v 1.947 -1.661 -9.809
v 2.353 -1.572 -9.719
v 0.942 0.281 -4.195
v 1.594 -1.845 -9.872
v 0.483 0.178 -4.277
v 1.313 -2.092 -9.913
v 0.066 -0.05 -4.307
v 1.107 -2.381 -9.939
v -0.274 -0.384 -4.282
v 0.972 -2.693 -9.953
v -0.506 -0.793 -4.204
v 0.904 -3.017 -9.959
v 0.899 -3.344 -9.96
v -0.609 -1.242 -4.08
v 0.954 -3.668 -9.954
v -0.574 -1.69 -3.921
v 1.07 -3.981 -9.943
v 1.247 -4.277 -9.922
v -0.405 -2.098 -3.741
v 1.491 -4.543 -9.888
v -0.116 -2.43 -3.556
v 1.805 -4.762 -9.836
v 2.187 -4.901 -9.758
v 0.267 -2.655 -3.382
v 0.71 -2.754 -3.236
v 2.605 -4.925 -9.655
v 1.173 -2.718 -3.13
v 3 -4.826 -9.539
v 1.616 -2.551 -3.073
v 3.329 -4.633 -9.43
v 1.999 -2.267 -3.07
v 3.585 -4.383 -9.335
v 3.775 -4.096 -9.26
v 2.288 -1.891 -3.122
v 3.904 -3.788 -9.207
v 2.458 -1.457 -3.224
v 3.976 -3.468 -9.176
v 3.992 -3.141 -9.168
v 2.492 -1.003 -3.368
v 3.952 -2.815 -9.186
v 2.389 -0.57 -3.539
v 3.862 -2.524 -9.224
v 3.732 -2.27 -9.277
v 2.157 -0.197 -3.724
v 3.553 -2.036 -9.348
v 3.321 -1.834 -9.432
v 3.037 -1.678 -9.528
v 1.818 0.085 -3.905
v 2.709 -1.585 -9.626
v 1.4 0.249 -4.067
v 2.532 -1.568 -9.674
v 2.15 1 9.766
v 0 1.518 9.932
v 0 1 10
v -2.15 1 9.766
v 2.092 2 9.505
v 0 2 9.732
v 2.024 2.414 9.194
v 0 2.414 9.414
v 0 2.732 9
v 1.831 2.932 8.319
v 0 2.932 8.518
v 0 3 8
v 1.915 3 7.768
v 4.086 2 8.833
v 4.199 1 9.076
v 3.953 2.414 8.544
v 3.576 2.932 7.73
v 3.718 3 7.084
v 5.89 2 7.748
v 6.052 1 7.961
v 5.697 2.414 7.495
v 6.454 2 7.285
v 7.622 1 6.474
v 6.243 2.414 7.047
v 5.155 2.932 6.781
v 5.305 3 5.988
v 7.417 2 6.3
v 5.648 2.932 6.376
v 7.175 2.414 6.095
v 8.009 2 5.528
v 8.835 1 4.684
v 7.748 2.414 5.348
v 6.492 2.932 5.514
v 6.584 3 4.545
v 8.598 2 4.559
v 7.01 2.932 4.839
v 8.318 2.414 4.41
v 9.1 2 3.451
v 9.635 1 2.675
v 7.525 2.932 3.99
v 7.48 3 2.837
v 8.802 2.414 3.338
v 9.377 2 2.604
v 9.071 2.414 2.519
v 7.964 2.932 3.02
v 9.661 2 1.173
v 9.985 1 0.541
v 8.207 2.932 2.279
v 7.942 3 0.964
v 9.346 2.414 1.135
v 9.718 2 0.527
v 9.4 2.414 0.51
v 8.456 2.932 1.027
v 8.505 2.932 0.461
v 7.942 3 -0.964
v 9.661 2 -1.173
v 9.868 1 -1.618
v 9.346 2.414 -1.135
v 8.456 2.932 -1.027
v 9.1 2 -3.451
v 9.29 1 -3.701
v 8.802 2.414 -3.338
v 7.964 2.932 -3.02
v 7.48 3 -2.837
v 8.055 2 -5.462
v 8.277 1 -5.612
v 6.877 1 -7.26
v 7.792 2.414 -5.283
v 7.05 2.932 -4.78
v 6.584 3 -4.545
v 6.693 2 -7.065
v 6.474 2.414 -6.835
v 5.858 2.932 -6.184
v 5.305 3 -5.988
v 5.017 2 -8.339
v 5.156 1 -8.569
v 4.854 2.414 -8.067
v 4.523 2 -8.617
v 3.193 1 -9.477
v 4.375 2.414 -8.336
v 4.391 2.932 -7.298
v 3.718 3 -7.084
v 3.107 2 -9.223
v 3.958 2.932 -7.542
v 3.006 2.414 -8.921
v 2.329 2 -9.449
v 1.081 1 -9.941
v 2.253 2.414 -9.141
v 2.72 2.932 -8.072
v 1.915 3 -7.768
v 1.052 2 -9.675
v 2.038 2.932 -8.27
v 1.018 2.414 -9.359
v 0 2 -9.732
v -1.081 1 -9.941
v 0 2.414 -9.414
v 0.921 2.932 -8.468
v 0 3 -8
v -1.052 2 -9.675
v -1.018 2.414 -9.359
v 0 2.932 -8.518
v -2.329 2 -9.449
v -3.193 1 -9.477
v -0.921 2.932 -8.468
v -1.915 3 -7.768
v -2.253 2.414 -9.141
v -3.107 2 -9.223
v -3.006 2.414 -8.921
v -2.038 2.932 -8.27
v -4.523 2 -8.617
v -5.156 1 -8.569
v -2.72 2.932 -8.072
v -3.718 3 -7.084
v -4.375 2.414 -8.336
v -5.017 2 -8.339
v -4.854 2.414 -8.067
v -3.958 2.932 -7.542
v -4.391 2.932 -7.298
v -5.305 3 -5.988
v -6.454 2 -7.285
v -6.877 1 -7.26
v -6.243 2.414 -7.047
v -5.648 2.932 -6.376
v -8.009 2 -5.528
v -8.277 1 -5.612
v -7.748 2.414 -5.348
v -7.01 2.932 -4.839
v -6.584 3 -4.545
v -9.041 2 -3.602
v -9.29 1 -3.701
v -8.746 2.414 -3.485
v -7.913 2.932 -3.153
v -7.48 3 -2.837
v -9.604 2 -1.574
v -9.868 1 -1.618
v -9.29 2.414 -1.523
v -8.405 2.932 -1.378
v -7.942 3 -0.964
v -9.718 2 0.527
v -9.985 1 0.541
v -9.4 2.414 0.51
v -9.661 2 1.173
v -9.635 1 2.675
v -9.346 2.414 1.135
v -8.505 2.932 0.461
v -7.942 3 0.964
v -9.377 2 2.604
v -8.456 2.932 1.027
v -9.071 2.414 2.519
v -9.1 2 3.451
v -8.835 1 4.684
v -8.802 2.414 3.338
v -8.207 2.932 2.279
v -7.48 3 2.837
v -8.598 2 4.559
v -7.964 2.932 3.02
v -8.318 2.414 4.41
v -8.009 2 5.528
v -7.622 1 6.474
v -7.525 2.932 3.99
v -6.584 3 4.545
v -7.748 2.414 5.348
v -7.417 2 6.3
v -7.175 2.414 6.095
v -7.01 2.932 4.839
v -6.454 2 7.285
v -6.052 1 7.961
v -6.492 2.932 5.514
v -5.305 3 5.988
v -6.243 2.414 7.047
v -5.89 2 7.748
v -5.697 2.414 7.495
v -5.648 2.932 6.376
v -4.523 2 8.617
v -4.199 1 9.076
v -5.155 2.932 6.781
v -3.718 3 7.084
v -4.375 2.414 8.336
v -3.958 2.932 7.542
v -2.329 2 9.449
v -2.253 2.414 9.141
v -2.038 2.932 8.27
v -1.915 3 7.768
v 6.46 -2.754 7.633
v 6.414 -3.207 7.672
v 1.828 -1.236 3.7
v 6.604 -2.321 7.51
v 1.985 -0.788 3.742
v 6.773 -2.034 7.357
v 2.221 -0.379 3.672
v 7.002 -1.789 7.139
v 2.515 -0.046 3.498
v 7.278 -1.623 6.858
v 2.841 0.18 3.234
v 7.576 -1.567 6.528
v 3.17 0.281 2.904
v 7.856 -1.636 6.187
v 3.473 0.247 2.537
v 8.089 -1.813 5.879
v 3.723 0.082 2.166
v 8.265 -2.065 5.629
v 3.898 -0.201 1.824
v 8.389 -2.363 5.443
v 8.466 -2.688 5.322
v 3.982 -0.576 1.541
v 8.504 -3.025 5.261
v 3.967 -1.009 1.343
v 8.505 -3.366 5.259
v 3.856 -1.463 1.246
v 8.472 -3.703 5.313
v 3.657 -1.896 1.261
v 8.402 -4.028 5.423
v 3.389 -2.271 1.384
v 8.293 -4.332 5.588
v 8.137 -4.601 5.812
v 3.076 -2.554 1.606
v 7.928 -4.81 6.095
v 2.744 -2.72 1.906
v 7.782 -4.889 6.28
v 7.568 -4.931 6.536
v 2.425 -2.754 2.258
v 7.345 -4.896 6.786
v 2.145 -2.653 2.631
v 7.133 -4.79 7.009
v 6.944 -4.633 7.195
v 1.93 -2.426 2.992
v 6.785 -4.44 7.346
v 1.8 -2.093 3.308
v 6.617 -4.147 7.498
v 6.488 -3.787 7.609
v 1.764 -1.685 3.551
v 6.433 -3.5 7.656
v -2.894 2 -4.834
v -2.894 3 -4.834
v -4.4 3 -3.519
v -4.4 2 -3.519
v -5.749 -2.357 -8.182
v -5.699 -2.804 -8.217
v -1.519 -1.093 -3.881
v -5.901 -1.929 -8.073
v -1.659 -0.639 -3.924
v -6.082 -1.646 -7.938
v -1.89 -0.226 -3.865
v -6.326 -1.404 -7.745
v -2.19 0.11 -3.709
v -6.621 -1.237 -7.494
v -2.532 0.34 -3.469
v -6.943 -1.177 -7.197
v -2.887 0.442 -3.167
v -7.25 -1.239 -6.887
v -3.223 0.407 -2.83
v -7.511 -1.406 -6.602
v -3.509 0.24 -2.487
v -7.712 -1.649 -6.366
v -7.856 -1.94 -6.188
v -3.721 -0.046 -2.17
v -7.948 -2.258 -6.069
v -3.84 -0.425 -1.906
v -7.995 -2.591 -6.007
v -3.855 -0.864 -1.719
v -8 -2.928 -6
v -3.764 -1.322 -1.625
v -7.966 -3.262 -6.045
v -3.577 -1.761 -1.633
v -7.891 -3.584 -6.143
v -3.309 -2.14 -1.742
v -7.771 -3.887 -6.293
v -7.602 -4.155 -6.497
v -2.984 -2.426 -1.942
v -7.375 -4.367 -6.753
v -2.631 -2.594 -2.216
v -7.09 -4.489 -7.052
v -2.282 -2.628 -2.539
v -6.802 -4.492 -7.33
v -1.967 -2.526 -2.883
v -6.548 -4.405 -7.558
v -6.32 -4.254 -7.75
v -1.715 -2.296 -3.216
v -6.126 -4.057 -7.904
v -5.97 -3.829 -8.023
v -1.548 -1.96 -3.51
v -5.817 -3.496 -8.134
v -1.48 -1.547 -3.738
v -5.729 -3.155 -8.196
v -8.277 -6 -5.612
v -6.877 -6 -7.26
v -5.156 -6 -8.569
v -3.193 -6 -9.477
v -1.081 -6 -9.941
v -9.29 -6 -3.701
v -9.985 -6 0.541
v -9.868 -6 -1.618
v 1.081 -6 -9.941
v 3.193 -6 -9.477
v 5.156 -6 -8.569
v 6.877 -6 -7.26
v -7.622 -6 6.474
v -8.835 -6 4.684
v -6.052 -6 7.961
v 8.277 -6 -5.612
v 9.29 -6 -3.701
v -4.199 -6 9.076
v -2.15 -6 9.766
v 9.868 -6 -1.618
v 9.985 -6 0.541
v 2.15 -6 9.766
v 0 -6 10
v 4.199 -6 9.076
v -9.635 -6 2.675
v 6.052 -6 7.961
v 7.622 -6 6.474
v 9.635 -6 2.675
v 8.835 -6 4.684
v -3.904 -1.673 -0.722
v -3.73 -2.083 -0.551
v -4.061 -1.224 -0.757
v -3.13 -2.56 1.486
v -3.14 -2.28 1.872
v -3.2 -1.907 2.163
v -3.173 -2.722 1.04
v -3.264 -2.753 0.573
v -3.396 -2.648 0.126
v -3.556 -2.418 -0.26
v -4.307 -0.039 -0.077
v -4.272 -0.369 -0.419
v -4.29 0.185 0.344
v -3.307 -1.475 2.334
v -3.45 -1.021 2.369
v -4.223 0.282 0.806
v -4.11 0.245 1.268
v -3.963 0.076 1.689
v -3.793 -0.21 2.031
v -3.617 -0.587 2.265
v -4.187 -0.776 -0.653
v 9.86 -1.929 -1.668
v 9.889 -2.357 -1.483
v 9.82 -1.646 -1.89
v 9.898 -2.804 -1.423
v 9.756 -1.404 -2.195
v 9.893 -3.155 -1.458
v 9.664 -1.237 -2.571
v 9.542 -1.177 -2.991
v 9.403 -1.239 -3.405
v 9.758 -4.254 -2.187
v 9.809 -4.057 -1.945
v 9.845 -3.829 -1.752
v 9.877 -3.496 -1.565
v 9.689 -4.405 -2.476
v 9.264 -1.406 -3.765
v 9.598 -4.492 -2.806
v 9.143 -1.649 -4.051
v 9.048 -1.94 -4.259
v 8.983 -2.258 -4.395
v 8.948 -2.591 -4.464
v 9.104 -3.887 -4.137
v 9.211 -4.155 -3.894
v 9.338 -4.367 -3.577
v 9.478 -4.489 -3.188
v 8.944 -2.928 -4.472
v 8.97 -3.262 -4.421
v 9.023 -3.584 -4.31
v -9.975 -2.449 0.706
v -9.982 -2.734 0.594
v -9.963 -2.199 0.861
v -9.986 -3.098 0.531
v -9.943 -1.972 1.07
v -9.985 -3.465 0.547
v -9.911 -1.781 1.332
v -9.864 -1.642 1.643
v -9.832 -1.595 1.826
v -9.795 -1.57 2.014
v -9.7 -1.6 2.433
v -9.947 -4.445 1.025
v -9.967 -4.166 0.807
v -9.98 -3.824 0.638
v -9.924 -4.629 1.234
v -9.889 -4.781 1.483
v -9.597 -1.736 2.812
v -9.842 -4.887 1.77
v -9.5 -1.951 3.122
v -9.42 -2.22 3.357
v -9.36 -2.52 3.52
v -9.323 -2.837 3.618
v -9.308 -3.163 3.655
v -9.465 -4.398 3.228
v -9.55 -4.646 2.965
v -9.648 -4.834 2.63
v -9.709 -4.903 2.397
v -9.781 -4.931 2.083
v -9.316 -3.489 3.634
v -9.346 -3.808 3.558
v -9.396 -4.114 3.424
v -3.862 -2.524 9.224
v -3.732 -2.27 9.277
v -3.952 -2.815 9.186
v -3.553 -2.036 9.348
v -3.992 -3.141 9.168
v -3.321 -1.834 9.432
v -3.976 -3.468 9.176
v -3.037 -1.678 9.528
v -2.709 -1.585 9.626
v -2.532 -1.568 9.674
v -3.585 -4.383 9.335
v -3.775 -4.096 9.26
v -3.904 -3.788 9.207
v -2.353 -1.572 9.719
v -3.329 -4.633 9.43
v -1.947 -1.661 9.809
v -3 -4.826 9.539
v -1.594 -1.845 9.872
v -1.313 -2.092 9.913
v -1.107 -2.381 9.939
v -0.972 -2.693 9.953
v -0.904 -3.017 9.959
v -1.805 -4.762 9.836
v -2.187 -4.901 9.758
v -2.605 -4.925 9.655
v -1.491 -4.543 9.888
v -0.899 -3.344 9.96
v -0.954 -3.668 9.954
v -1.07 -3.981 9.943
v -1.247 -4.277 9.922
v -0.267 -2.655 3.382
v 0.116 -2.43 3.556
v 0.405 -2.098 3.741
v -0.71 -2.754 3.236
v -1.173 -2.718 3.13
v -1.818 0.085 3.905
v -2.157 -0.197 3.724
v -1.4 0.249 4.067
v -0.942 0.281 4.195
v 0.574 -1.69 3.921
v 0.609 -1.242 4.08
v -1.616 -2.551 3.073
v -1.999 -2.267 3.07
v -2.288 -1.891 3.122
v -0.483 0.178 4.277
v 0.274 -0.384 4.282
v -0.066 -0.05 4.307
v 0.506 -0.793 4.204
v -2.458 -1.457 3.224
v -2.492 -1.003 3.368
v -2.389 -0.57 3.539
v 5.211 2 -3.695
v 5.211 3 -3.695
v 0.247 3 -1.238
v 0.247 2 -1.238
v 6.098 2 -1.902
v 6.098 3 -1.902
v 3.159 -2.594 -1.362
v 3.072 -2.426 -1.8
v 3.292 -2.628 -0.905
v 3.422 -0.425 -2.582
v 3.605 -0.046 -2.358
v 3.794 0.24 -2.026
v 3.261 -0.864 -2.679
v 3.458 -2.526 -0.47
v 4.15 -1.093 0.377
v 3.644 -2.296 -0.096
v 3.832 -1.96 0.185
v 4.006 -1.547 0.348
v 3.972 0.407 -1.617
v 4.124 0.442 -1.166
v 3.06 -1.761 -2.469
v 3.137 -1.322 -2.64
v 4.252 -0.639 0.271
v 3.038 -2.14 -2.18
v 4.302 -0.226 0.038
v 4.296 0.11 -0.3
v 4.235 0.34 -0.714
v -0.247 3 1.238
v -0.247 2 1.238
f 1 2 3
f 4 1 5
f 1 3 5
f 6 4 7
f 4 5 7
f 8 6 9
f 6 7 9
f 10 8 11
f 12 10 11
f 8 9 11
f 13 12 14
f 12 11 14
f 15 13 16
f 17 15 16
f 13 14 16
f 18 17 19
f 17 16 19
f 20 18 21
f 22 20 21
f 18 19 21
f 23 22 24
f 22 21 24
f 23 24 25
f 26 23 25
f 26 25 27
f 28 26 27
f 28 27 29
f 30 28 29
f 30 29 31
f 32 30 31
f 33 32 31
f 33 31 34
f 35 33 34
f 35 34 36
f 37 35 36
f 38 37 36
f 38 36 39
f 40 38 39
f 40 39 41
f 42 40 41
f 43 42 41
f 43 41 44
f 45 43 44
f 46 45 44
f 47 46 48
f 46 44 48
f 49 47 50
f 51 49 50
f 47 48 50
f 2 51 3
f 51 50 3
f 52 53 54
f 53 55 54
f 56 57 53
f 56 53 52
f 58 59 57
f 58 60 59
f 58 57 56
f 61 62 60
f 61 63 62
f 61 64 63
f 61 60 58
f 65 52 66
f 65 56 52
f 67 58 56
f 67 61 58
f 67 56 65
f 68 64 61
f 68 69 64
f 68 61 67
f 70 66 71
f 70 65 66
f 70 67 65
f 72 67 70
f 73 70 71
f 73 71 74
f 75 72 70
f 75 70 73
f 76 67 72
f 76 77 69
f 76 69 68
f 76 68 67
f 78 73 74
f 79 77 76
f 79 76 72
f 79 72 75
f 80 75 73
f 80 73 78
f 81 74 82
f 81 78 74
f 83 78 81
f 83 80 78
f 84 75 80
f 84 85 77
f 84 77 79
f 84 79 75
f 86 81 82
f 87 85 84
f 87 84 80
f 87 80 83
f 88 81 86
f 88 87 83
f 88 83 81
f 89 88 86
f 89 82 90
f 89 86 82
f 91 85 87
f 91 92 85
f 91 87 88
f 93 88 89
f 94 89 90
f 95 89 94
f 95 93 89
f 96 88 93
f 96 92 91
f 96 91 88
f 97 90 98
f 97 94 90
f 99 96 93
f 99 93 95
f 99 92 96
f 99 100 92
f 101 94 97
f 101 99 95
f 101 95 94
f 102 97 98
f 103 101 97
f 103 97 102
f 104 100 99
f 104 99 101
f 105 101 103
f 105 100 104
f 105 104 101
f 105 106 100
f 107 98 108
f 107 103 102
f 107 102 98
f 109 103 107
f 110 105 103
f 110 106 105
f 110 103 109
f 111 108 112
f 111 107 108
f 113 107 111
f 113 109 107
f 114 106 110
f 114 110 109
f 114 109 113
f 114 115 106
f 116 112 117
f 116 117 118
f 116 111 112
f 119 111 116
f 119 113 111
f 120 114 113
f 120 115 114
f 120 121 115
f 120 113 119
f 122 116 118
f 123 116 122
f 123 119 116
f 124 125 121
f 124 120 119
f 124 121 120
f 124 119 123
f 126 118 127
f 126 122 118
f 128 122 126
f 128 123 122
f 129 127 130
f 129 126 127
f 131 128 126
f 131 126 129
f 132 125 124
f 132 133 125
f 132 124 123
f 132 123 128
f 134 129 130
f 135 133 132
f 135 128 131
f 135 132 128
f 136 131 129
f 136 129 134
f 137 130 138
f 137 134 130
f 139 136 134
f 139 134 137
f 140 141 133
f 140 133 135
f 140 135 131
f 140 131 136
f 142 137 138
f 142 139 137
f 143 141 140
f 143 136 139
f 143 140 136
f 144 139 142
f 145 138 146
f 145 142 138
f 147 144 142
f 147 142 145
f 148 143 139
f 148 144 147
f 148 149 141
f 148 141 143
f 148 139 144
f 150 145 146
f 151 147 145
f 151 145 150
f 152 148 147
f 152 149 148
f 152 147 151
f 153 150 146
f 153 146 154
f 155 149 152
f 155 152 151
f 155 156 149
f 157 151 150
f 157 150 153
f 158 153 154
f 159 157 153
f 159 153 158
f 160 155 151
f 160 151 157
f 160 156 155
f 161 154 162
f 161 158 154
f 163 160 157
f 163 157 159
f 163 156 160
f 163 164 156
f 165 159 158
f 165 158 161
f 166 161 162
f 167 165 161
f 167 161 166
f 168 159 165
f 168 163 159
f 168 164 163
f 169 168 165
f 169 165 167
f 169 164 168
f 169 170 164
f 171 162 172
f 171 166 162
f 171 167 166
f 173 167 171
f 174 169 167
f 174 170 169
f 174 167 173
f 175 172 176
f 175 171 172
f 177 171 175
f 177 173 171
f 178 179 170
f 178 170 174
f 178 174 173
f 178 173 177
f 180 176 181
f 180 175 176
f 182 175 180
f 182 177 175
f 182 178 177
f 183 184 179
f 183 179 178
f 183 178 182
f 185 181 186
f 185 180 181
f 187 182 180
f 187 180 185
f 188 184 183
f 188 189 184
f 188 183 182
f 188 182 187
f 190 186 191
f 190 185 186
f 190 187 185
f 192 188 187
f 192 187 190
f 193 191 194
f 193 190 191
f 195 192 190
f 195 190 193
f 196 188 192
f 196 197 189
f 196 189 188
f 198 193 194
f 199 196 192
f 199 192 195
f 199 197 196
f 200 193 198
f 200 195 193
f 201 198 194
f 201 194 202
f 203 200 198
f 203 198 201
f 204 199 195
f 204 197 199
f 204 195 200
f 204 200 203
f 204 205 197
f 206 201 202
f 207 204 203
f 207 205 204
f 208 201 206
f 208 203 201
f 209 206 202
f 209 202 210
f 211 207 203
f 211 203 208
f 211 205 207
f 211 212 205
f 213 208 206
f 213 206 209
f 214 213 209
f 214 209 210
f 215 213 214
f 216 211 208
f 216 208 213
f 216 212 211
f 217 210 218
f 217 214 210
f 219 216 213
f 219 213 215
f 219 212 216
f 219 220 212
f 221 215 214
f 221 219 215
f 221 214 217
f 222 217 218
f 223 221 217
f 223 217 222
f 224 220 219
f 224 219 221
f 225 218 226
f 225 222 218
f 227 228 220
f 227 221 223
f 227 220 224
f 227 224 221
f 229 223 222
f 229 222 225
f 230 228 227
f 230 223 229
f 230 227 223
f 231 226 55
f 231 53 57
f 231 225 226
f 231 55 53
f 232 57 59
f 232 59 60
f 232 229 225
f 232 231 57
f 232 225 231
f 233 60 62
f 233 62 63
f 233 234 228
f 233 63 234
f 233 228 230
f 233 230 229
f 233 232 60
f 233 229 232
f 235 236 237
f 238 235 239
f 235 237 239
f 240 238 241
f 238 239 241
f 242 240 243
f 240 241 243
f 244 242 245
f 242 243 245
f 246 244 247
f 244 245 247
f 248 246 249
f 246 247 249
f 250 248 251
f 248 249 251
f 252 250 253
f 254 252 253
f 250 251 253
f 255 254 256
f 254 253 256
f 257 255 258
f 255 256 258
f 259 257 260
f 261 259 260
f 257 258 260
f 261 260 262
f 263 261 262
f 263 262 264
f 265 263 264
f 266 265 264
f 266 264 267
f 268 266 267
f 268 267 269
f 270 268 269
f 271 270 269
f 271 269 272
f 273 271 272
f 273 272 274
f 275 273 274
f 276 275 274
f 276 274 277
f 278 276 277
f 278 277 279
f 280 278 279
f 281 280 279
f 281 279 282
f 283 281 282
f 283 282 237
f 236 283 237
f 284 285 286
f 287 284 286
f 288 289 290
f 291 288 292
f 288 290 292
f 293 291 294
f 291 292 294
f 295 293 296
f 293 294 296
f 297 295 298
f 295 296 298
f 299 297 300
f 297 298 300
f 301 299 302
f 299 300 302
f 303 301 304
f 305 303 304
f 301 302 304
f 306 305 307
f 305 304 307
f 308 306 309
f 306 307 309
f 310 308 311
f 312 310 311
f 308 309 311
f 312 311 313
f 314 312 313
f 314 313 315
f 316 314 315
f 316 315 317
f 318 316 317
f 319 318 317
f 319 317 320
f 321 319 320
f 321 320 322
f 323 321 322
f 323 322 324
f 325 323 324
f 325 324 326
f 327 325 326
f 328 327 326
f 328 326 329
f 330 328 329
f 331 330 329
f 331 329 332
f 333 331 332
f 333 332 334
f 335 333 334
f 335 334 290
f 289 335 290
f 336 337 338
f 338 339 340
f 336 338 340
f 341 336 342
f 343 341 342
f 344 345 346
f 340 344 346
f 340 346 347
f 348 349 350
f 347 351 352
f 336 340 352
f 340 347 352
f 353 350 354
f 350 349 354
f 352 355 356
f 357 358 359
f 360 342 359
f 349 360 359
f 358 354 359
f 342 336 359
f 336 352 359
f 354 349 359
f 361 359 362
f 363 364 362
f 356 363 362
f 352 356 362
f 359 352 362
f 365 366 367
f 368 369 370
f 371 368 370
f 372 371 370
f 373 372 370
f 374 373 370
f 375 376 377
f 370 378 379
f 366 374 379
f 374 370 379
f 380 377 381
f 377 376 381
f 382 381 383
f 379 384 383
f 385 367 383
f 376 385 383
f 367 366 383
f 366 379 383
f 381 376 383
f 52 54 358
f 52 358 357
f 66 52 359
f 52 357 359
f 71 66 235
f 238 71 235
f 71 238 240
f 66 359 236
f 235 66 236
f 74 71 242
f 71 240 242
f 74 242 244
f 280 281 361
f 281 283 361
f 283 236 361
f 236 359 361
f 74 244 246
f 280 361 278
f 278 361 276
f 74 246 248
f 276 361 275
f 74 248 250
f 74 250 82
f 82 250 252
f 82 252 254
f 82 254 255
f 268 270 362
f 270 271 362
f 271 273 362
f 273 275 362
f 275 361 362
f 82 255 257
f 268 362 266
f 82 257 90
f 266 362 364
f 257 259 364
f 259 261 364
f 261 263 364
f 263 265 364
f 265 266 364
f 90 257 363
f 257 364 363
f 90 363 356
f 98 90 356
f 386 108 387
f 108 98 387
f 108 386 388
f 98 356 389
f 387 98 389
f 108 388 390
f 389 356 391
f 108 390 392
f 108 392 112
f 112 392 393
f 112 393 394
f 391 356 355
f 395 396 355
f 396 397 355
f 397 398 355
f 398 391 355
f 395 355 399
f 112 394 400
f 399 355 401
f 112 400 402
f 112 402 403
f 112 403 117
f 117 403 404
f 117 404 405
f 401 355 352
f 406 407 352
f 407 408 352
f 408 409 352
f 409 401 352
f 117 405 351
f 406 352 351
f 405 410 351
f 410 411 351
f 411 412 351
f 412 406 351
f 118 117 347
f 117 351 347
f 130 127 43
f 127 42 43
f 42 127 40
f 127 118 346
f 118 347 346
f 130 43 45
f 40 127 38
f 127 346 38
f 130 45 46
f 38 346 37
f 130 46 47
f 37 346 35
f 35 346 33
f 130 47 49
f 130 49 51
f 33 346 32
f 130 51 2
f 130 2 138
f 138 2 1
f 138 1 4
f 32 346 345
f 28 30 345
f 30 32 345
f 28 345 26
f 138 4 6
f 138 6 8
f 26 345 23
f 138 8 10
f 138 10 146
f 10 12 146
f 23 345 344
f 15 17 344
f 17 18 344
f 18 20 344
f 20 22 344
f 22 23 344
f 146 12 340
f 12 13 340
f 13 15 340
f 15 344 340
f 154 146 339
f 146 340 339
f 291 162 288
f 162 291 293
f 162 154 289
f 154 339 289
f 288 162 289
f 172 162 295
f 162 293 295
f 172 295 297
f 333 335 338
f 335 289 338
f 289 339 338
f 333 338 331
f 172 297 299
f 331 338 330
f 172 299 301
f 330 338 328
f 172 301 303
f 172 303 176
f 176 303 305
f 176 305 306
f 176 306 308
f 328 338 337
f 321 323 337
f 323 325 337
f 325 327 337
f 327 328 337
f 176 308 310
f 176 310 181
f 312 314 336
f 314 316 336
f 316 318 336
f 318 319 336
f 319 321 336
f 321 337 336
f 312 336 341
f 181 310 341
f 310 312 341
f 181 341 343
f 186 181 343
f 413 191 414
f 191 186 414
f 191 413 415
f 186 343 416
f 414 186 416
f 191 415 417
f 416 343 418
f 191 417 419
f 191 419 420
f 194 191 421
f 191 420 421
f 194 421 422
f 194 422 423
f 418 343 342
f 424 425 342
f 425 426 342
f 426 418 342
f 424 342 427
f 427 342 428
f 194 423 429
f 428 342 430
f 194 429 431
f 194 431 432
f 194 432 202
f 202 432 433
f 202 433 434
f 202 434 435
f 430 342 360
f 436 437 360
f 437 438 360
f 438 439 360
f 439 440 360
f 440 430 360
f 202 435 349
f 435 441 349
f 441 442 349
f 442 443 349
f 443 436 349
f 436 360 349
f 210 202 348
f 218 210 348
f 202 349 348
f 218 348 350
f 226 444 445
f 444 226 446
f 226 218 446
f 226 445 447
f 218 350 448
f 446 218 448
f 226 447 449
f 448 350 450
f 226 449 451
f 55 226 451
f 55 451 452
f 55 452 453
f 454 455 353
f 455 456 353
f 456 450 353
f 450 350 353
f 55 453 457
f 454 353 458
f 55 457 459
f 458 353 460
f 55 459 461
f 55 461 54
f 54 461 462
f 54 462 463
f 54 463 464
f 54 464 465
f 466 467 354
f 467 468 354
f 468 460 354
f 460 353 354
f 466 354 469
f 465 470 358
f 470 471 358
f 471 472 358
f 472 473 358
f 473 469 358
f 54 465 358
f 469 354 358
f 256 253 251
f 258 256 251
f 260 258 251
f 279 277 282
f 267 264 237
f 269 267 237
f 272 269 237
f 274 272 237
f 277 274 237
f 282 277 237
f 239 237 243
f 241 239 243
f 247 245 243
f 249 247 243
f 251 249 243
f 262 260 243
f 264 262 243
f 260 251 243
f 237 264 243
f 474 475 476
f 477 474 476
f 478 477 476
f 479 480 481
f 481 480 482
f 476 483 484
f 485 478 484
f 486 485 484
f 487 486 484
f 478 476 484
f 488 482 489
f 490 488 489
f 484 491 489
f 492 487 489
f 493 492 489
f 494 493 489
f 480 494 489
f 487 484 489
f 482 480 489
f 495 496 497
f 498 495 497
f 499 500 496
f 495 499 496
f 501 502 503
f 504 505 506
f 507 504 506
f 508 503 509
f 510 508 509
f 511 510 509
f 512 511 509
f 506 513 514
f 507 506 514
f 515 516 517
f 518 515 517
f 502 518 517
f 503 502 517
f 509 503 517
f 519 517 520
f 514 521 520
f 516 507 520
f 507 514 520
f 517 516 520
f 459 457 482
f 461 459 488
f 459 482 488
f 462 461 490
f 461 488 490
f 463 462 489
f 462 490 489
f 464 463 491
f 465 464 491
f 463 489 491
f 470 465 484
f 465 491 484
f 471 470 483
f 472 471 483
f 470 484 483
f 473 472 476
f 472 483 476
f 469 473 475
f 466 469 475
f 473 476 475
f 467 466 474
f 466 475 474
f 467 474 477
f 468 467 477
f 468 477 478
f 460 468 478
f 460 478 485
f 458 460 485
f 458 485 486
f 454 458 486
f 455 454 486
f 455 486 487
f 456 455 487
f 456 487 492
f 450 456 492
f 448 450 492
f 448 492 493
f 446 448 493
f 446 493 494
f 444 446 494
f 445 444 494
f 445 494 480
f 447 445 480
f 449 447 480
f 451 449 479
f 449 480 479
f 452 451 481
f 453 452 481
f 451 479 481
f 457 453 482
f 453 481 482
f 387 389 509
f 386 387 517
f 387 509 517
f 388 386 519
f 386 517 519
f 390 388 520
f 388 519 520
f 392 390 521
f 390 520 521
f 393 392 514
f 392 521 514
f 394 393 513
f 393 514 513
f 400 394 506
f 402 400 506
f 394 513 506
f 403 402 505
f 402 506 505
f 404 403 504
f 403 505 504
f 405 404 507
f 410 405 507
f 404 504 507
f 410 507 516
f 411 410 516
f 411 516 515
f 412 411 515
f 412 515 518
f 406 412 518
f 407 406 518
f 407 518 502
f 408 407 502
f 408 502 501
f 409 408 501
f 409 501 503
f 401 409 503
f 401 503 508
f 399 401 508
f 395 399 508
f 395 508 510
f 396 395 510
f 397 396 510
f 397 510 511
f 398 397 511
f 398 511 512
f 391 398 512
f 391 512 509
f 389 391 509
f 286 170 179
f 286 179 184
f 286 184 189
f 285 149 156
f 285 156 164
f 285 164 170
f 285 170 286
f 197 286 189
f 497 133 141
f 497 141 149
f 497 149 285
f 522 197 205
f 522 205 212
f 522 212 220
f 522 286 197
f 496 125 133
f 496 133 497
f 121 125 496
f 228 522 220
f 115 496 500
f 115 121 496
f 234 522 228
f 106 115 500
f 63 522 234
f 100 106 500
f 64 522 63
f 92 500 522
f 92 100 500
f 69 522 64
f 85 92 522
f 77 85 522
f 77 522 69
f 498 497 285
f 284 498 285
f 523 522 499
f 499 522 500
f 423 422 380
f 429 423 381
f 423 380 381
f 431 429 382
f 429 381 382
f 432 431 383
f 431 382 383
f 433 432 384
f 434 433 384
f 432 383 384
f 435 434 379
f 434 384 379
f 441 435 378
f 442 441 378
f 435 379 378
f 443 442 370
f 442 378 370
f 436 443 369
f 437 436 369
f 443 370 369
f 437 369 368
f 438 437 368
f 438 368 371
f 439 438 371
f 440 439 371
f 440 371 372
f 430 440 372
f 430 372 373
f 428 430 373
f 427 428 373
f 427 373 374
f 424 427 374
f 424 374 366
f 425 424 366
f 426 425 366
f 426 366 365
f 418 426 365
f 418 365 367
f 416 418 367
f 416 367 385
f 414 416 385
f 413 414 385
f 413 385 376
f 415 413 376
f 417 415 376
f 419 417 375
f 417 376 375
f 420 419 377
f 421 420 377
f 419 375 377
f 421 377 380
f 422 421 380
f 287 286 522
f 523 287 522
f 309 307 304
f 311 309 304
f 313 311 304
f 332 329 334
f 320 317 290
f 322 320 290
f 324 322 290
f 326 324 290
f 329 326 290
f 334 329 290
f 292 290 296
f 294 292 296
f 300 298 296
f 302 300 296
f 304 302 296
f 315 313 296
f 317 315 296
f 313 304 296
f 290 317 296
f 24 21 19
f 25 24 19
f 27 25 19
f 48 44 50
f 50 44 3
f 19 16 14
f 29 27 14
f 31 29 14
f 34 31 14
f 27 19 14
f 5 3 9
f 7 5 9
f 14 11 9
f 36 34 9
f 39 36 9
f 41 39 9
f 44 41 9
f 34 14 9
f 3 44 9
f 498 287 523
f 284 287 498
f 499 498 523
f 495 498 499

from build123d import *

# Parameters (mm, degrees)
BASE_DEPTH              = 3
BASE_DEPTH_BACK         = 6
SKETCH1_R               = 10
SKETCH3_R               = 1.6
HOLE2_DEPTH             = 19.1581212
HOLE2MIRROR_COUNT       = 2
SKETCH4_R               = 1.6
HOLE3_DEPTH             = 19.100993715
SKETCH5_R               = 1.6
CUT_EXTRUDE1_DEPTH      = 19.311666101
SKETCH6_R               = 1.6
CUT_EXTRUDE2_DEPTH      = 19.560472272
SKETCH7_R               = 1.6
CUT_EXTRUDE3_DEPTH      = 19.646604846
FILLET1_R               = 2
CUT_EXTRUDE_THIN1_DEPTH = 1


with BuildPart() as part:
    # Sketch1 → base (new, two sides: drawn at the far end of the back side and taken through both)
    with BuildSketch(Plane(origin=(0, 0, 0), x_dir=(1, 0, 0), z_dir=(0, 1, 0)).offset(-BASE_DEPTH_BACK)):
        Circle(SKETCH1_R)
    extrude(amount=BASE_DEPTH + BASE_DEPTH_BACK)

    # Sketch3 → hole2 (cut, through all)
    with BuildSketch(Plane(origin=(-0.941672921, -1.236067977, 3.685836142), x_dir=(-0.9718935871364875, 0.07382318789513377, -0.22354639834264944), z_dir=(0.23541823021467095, 0.3090169943749464, -0.921459035481267))):
        Circle(SKETCH3_R)
    hole2 = extrude(amount=-HOLE2_DEPTH, mode=Mode.SUBTRACT)

    # hole2mirror: hole2 ×2 about axis
    hole2mirror_axis = Axis((0, 5.5, 0), (0, -1, 0))
    for i in range(1, HOLE2MIRROR_COUNT):
        add(hole2.rotate(hole2mirror_axis, i * 360 / HOLE2MIRROR_COUNT), mode=Mode.SUBTRACT)

    # Sketch4 → hole3 (cut, through all)
    with BuildSketch(Plane(origin=(-3.717841, -1.236067977, 0.806098168), x_dir=(-0.19123247894507908, -0.06357892752956036, -0.979483465389136), z_dir=(0.9294602499075393, 0.30901699437494623, -0.20152454200243008))):
        Circle(SKETCH4_R)
    extrude(amount=-HOLE3_DEPTH, mode=Mode.SUBTRACT)

    # Sketch5 → Cut-Extrude1 (cut, through all)
    with BuildSketch(Plane(origin=(3.671965021, -1.093066116, -1.149730122), x_dir=(0.2754858058396647, -0.08200628219437099, 0.9578008876909271), z_dir=(-0.9179912552075574, 0.27326652891267317, 0.2874325304110031))):
        Circle(SKETCH5_R)
    extrude(amount=-CUT_EXTRUDE1_DEPTH, mode=Mode.SUBTRACT)

    # Sketch6 → Cut-Extrude2 (cut, through all)
    with BuildSketch(Plane(origin=(2.875583134, -1.236067977, 2.490613899), x_dir=(-0.5720437997755544, 0.24589274231852376, 0.782497699941298), z_dir=(-0.7188957835464718, 0.30901699437494723, -0.6226534747245682))):
        Circle(SKETCH6_R)
    extrude(amount=-CUT_EXTRUDE2_DEPTH, mode=Mode.SUBTRACT)

    # Sketch7 → Cut-Extrude3 (cut, through all)
    with BuildSketch(Plane(origin=(-2.670502563, -1.093066116, -2.770130417), x_dir=(0.7444971483747472, -0.2450509606833859, -0.6210265877802813), z_dir=(0.6676256406564008, 0.2732665289126714, 0.6925326043690294))):
        Circle(SKETCH7_R)
    extrude(amount=-CUT_EXTRUDE3_DEPTH, mode=Mode.SUBTRACT)

    # Fillet1
    fillet1_edges = [part.edges().sort_by_distance(p)[0] for p in [
        (-10, 3, 0),
    ]]
    fillet(fillet1_edges, radius=FILLET1_R)

    # Sketch9 → Cut-Extrude-Thin1 (cut)
    with BuildSketch(Plane(origin=(0, 3, 0), x_dir=(1, 0, 0), z_dir=(0, 1, 0))):
        Polygon((-4.40005736, 3.518760981), (-0.246688962, -1.237871846), (6.097894842, 1.902273668), (5.210740629, 3.694746095), (0.246688962, 1.237871846), (-2.893541545, 4.834211512), align=None)
    extrude(amount=-CUT_EXTRUDE_THIN1_DEPTH, mode=Mode.SUBTRACT)


solid = part.part
